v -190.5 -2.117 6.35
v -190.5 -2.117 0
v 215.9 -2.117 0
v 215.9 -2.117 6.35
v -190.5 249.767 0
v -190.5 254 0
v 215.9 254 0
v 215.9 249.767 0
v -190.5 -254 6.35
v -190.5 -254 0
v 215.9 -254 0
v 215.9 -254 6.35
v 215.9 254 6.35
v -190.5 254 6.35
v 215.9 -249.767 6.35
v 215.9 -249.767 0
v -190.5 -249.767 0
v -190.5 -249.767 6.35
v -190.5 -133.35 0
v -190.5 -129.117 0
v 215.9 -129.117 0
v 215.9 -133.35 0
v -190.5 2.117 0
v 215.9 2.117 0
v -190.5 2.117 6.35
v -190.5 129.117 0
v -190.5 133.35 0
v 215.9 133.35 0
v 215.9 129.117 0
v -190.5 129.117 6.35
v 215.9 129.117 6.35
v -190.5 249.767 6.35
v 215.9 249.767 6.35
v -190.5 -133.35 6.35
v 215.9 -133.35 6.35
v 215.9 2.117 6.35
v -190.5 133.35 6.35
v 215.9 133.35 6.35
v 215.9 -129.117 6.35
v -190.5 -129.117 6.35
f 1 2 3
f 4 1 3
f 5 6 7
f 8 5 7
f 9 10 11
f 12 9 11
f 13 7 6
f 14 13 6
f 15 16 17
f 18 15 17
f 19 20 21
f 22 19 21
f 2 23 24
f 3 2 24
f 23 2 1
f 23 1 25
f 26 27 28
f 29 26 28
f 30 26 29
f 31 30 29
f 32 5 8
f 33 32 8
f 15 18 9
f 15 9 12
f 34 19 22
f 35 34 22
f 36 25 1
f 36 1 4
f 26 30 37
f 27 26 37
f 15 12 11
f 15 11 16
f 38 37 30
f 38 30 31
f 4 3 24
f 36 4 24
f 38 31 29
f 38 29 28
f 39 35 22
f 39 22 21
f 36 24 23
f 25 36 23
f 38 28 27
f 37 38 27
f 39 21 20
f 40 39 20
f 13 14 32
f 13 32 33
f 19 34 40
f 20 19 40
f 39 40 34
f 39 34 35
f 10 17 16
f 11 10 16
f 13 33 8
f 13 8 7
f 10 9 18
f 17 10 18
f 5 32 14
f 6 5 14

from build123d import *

# Parameters (mm, degrees)
F0_W     = 381
F0_H     = 4.2333333333
F0_W_2   = 25.4
F1_DEPTH = 6.35


with BuildPart() as f1:
    # F0 (on Top) → F1 (new body)
    with BuildSketch(Plane.XY):
        with Locations((0, 251.8833333333)):
            Rectangle(F0_W, F0_H)
        with Locations((203.2, 251.8833333333)):
            Rectangle(F0_W_2, F0_H)
    extrude(amount=F1_DEPTH)


with BuildPart() as f1b:
    # F0 (on Top) → F1, piece 2 (new body)
    with BuildSketch(Plane.XY):
        with Locations((203.2, 131.2333333333)):
            Rectangle(F0_W_2, F0_H)
        with Locations((0, 131.2333333333)):
            Rectangle(F0_W, F0_H)
    extrude(amount=F1_DEPTH)


with BuildPart() as f1c:
    # F0 (on Top) → F1, piece 3 (new body)
    with BuildSketch(Plane.XY):
        with Locations((203.2, 0)):
            Rectangle(F0_W_2, F0_H)
        Rectangle(F0_W, F0_H)
    extrude(amount=F1_DEPTH)


with BuildPart() as f1d:
    # F0 (on Top) → F1, piece 4 (new body)
    with BuildSketch(Plane.XY):
        with Locations((203.2, -131.2333333333)):
            Rectangle(F0_W_2, F0_H)
        with Locations((0, -131.2333333333)):
            Rectangle(F0_W, F0_H)
    extrude(amount=F1_DEPTH)


with BuildPart() as f1e:
    # F0 (on Top) → F1, piece 5 (new body)
    with BuildSketch(Plane.XY):
        with Locations((203.2, -251.8833333333)):
            Rectangle(F0_W_2, F0_H)
        with Locations((0, -251.8833333333)):
            Rectangle(F0_W, F0_H)
    extrude(amount=F1_DEPTH)


solid = Compound([f1.part, f1b.part, f1c.part, f1d.part, f1e.part])
